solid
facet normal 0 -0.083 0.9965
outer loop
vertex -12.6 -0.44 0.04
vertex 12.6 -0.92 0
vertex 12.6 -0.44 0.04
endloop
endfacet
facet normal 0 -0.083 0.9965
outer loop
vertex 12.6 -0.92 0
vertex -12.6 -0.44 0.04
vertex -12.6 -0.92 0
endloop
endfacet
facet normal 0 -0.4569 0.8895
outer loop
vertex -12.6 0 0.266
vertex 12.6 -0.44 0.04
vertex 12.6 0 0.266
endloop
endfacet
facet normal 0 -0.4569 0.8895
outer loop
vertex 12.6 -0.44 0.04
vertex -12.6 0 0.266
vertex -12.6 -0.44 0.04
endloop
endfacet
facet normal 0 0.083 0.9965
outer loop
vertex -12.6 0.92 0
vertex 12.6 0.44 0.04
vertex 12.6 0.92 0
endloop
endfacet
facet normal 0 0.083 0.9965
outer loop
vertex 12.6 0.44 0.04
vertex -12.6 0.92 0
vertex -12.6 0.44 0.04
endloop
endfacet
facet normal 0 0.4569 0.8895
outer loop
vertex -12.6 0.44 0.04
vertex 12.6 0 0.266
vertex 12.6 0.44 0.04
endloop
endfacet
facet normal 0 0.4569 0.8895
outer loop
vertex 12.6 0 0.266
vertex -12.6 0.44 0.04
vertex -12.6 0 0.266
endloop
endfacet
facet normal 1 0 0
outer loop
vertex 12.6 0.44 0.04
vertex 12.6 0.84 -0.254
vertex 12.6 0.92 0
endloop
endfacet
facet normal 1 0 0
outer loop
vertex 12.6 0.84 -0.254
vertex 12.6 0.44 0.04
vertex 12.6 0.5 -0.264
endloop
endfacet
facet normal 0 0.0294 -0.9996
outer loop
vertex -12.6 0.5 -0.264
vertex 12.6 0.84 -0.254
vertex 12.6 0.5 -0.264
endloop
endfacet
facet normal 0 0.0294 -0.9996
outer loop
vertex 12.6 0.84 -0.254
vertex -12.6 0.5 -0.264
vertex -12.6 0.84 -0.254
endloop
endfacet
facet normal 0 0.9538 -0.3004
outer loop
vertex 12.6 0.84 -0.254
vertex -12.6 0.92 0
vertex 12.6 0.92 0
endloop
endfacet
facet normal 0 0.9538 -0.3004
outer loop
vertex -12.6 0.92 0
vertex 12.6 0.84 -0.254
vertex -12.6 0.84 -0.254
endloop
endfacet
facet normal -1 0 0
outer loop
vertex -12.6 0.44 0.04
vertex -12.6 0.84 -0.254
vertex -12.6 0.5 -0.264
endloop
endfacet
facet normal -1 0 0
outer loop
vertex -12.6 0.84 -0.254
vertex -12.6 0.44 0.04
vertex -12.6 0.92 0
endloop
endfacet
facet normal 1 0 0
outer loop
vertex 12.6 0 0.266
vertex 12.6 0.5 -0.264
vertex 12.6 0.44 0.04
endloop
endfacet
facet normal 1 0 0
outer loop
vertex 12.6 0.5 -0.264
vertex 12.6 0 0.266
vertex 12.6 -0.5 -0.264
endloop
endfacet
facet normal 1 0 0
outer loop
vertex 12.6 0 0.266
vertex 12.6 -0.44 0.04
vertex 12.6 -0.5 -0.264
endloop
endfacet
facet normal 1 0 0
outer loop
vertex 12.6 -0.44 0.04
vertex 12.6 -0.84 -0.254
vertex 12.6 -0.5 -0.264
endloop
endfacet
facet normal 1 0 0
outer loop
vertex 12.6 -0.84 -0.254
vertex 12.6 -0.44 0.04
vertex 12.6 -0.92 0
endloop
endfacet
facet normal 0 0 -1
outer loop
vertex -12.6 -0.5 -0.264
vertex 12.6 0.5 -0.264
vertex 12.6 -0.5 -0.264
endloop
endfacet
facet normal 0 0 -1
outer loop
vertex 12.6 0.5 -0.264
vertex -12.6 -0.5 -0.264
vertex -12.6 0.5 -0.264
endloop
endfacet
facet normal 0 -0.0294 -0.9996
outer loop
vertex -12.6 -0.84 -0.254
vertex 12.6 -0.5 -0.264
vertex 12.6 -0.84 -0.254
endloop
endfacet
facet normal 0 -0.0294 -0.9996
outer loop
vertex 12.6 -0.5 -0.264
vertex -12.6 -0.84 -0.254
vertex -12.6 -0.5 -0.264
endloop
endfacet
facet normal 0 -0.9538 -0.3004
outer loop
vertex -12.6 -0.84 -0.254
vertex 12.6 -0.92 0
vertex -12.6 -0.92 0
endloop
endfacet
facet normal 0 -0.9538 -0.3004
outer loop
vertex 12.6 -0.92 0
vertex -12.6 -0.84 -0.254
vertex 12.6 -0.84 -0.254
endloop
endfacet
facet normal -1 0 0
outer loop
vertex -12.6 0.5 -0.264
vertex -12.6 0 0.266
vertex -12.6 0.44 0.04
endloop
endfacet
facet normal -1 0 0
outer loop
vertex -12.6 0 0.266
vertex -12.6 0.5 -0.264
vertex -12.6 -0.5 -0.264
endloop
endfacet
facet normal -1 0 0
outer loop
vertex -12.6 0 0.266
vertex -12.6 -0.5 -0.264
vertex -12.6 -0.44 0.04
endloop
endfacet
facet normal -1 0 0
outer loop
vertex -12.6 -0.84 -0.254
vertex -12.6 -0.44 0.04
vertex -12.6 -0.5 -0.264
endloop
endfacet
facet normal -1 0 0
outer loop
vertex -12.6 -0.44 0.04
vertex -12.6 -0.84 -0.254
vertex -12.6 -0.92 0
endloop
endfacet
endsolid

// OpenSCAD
use <../lib.scad>
function ldraw_lib__6427k03() = [
// 0 ~Duplo Suitcase Joiner
// 0 Name: 6427k03.dat
// 0 Author: Gerald Lasser [GeraldLasser]
// 0 !LDRAW_ORG Part UPDATE 2025-03
// 0 !LICENSE Licensed under CC BY 4.0 : see CAreadme.txt
// 
// 0 BFC CERTIFY CCW
  [0,"BFC","CERTIFY"],
  [0,"BFC","CCW"],
// 
// 0 !HISTORY 2025-03-30 [OrionP] Official Update 2025-03
// 
// 2 24 31.5 -.665 0 31.5 -.1 1.1
  [2,24,31.5,-.665,0,31.5,-.1,1.1],
// 2 24 -31.5 -.665 0 -31.5 -.1 1.1
  [2,24,-31.5,-.665,0,-31.5,-.1,1.1],
// 2 24 -31.5 -.665 0 31.5 -.665 0
  [2,24,-31.5,-.665,0,31.5,-.665,0],
// 4 16 31.5 -.1 -1.1 -31.5 -.1 -1.1 -31.5 0 -2.3 31.5 0 -2.3
  [4,16,31.5,-.1,-1.1,-31.5,-.1,-1.1,-31.5,0,-2.3,31.5,0,-2.3],
// 4 16 31.5 -.1 -1.1 31.5 -.665 0 -31.5 -.665 0 -31.5 -.1 -1.1
  [4,16,31.5,-.1,-1.1,31.5,-.665,0,-31.5,-.665,0,-31.5,-.1,-1.1],
// 4 16 -31.5 0 2.3 -31.5 -.1 1.1 31.5 -.1 1.1 31.5 0 2.3
  [4,16,-31.5,0,2.3,-31.5,-.1,1.1,31.5,-.1,1.1,31.5,0,2.3],
// 4 16 -31.5 -.665 0 31.5 -.665 0 31.5 -.1 1.1 -31.5 -.1 1.1
  [4,16,-31.5,-.665,0,31.5,-.665,0,31.5,-.1,1.1,-31.5,-.1,1.1],
// 4 16 31.5 .659 1.25 31.5 .634 2.1 31.5 0 2.3 31.5 -.1 1.1
  [4,16,31.5,.659,1.25,31.5,.634,2.1,31.5,0,2.3,31.5,-.1,1.1],
// 4 16 31.5 .634 2.1 31.5 .659 1.25 -31.5 .659 1.25 -31.5 .634 2.1
  [4,16,31.5,.634,2.1,31.5,.659,1.25,-31.5,.659,1.25,-31.5,.634,2.1],
// 4 16 31.5 0 2.3 31.5 .634 2.1 -31.5 .634 2.1 -31.5 0 2.3
  [4,16,31.5,0,2.3,31.5,.634,2.1,-31.5,.634,2.1,-31.5,0,2.3],
// 4 16 -31.5 0 2.3 -31.5 .634 2.1 -31.5 .659 1.25 -31.5 -.1 1.1
  [4,16,-31.5,0,2.3,-31.5,.634,2.1,-31.5,.659,1.25,-31.5,-.1,1.1],
// 2 24 31.5 -.665 0 31.5 -.1 -1.1
  [2,24,31.5,-.665,0,31.5,-.1,-1.1],
// 2 24 31.5 -.1 1.1 31.5 0 2.3
  [2,24,31.5,-.1,1.1,31.5,0,2.3],
// 2 24 -31.5 .659 1.25 -31.5 .659 -1.25
  [2,24,-31.5,.659,1.25,-31.5,.659,-1.25],
// 2 24 31.5 .634 -2.1 31.5 0 -2.3
  [2,24,31.5,.634,-2.1,31.5,0,-2.3],
// 2 24 -31.5 0 -2.3 -31.5 .634 -2.1
  [2,24,-31.5,0,-2.3,-31.5,.634,-2.1],
// 5 24 -31.5 .659 -1.25 31.5 .659 -1.25 -31.5 .659 1.25 31.5 .634 -2.1
  [5,24,-31.5,.659,-1.25,31.5,.659,-1.25,-31.5,.659,1.25,31.5,.634,-2.1],
// 2 24 -31.5 .634 -2.1 -31.5 .659 -1.25
  [2,24,-31.5,.634,-2.1,-31.5,.659,-1.25],
// 2 24 -31.5 0 -2.3 -31.5 -.1 -1.1
  [2,24,-31.5,0,-2.3,-31.5,-.1,-1.1],
// 2 24 -31.5 .634 2.1 -31.5 0 2.3
  [2,24,-31.5,.634,2.1,-31.5,0,2.3],
// 2 24 31.5 .659 -1.25 31.5 .634 -2.1
  [2,24,31.5,.659,-1.25,31.5,.634,-2.1],
// 2 24 31.5 0 -2.3 31.5 -.1 -1.1
  [2,24,31.5,0,-2.3,31.5,-.1,-1.1],
// 2 24 31.5 .634 2.1 -31.5 .634 2.1
  [2,24,31.5,.634,2.1,-31.5,.634,2.1],
// 2 24 -31.5 -.1 1.1 -31.5 0 2.3
  [2,24,-31.5,-.1,1.1,-31.5,0,2.3],
// 2 24 31.5 .659 -1.25 31.5 .659 1.25
  [2,24,31.5,.659,-1.25,31.5,.659,1.25],
// 2 24 -31.5 .634 2.1 -31.5 .659 1.25
  [2,24,-31.5,.634,2.1,-31.5,.659,1.25],
// 2 24 -31.5 -.1 -1.1 -31.5 -.665 0
  [2,24,-31.5,-.1,-1.1,-31.5,-.665,0],
// 2 24 31.5 .634 2.1 31.5 .659 1.25
  [2,24,31.5,.634,2.1,31.5,.659,1.25],
// 2 24 31.5 0 -2.3 -31.5 0 -2.3
  [2,24,31.5,0,-2.3,-31.5,0,-2.3],
// 2 24 31.5 0 2.3 31.5 .634 2.1
  [2,24,31.5,0,2.3,31.5,.634,2.1],
// 2 24 -31.5 0 2.3 31.5 0 2.3
  [2,24,-31.5,0,2.3,31.5,0,2.3],
// 5 24 31.5 -.1 1.1 -31.5 -.1 1.1 -31.5 -.665 0 31.5 0 2.3
  [5,24,31.5,-.1,1.1,-31.5,-.1,1.1,-31.5,-.665,0,31.5,0,2.3],
// 5 24 -31.5 .659 1.25 31.5 .659 1.25 31.5 .659 -1.25 -31.5 .634 2.1
  [5,24,-31.5,.659,1.25,31.5,.659,1.25,31.5,.659,-1.25,-31.5,.634,2.1],
// 5 24 31.5 -.1 -1.1 -31.5 -.1 -1.1 31.5 -.665 0 -31.5 0 -2.3
  [5,24,31.5,-.1,-1.1,-31.5,-.1,-1.1,31.5,-.665,0,-31.5,0,-2.3],
// 2 24 -31.5 .634 -2.1 31.5 .634 -2.1
  [2,24,-31.5,.634,-2.1,31.5,.634,-2.1],
// 4 16 31.5 -.665 0 31.5 .659 -1.25 31.5 .659 1.25 31.5 -.1 1.1
  [4,16,31.5,-.665,0,31.5,.659,-1.25,31.5,.659,1.25,31.5,-.1,1.1],
// 3 16 31.5 -.665 0 31.5 -.1 -1.1 31.5 .659 -1.25
  [3,16,31.5,-.665,0,31.5,-.1,-1.1,31.5,.659,-1.25],
// 4 16 31.5 0 -2.3 31.5 .634 -2.1 31.5 .659 -1.25 31.5 -.1 -1.1
  [4,16,31.5,0,-2.3,31.5,.634,-2.1,31.5,.659,-1.25,31.5,-.1,-1.1],
// 4 16 -31.5 .659 1.25 31.5 .659 1.25 31.5 .659 -1.25 -31.5 .659 -1.25
  [4,16,-31.5,.659,1.25,31.5,.659,1.25,31.5,.659,-1.25,-31.5,.659,-1.25],
// 4 16 -31.5 .659 -1.25 31.5 .659 -1.25 31.5 .634 -2.1 -31.5 .634 -2.1
  [4,16,-31.5,.659,-1.25,31.5,.659,-1.25,31.5,.634,-2.1,-31.5,.634,-2.1],
// 4 16 -31.5 .634 -2.1 31.5 .634 -2.1 31.5 0 -2.3 -31.5 0 -2.3
  [4,16,-31.5,.634,-2.1,31.5,.634,-2.1,31.5,0,-2.3,-31.5,0,-2.3],
// 4 16 -31.5 .659 1.25 -31.5 .659 -1.25 -31.5 -.665 0 -31.5 -.1 1.1
  [4,16,-31.5,.659,1.25,-31.5,.659,-1.25,-31.5,-.665,0,-31.5,-.1,1.1],
// 3 16 -31.5 -.665 0 -31.5 .659 -1.25 -31.5 -.1 -1.1
  [3,16,-31.5,-.665,0,-31.5,.659,-1.25,-31.5,-.1,-1.1],
// 4 16 -31.5 .659 -1.25 -31.5 .634 -2.1 -31.5 0 -2.3 -31.5 -.1 -1.1
  [4,16,-31.5,.659,-1.25,-31.5,.634,-2.1,-31.5,0,-2.3,-31.5,-.1,-1.1],
];
module ldraw_lib__6427k03(step=0, col=false, unit=2/5, alt=false, line=0.2, solid=!$preview)
    makepoly(ldraw_lib__6427k03(), step=step, col=col, unit=unit, alt=alt, line=line, solid=solid);
ldraw_lib__6427k03(line=0.2);
